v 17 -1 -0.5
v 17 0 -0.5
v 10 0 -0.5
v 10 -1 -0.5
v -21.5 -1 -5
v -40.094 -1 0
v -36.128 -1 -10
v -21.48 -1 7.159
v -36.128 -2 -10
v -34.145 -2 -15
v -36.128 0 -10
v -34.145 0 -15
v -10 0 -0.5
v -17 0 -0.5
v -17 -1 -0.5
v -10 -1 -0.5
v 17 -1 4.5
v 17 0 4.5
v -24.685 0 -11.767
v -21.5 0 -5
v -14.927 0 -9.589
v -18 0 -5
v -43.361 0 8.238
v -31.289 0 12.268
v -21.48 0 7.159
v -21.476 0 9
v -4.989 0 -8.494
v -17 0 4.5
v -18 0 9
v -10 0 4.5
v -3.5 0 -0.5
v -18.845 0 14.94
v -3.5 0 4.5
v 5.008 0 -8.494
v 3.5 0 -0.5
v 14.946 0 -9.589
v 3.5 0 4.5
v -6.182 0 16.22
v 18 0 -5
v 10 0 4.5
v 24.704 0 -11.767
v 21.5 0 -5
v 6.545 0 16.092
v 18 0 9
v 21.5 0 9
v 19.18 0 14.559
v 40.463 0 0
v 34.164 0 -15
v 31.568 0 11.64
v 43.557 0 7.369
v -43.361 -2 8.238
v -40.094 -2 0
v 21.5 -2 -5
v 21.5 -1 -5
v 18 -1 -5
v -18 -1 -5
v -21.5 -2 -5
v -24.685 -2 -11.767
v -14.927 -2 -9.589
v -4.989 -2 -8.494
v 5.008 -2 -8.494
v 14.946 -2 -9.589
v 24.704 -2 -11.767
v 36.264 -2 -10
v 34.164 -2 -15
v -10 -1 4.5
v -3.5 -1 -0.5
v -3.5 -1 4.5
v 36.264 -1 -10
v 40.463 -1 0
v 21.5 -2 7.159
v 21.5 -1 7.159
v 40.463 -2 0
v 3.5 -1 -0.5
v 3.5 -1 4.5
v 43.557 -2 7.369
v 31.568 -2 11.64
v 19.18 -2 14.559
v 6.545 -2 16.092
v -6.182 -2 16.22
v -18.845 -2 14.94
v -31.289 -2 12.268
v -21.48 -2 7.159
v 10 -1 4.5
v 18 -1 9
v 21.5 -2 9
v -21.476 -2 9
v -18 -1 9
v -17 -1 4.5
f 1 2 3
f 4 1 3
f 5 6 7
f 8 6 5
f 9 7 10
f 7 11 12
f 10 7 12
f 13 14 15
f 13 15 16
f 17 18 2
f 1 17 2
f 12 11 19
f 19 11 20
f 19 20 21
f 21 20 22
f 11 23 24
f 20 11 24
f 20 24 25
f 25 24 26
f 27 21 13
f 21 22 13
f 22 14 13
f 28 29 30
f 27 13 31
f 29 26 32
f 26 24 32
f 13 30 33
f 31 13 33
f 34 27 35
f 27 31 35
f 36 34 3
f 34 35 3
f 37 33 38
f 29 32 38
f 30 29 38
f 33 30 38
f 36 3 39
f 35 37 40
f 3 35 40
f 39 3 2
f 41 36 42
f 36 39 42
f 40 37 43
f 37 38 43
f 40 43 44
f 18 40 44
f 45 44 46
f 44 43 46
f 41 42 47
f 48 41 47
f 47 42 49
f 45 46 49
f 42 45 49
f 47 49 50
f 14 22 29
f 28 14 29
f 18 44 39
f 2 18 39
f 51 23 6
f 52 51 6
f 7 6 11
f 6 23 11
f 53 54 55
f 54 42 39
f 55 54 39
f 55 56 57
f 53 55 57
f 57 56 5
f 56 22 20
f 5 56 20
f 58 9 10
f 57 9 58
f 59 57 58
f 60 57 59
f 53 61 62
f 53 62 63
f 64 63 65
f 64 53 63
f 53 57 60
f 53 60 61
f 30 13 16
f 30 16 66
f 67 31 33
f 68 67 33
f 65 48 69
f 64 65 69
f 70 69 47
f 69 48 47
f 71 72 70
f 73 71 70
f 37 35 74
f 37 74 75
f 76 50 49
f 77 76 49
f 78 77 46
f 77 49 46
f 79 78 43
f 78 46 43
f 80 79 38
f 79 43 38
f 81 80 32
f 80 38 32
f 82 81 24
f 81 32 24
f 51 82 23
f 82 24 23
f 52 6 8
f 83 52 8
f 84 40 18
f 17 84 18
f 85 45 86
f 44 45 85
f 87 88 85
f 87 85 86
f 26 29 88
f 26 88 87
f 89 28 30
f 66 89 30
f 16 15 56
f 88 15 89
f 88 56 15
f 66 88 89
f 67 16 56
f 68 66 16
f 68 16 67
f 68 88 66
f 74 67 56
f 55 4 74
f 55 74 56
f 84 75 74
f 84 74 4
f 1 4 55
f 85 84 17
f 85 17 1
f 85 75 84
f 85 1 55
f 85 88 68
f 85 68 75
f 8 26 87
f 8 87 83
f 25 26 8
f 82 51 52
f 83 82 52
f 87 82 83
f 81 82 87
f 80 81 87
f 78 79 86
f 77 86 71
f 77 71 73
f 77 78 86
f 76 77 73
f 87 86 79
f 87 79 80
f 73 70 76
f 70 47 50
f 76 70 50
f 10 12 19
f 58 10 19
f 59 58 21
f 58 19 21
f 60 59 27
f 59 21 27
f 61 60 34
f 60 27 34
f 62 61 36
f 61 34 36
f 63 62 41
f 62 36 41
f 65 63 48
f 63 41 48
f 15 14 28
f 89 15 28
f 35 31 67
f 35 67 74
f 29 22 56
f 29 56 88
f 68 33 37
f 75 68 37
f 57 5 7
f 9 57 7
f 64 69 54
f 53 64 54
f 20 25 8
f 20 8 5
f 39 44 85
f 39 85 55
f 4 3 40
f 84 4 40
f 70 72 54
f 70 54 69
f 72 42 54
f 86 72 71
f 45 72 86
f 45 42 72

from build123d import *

# Parameters (mm, degrees)
F1_DEPTH = 2
F0_W     = 36
F0_H     = 14
F0_W_2   = 7
F0_H_2   = 5
F2_DEPTH = 1
F3_DEPTH = 2
F4_DEPTH = 1
F5_DEPTH = 1
F6_DEPTH = 2.001
F7_DEPTH = 2.001
F8_DEPTH = 1


# Not quite as in the source:
# - ends of sketch curves that miss each other by under 0.0002 mm in the source are joined


with BuildPart() as f1:
    # F0 (on Front) → F1 (new body)
    with BuildSketch(Plane.XZ):
        with BuildLine():
            Line((40.4628534786, 0), (43.5572046873, 7.3690142199))
            ThreePointArc((43.5572046873, 7.3690142199), (0.1833509298, 16.332060188), (-43.3610966095, 8.2383298181))
            Line((-43.3610966095, 8.2383298181), (-40.0939611875, 0))
            Line((-40.0939611875, 0), (-21.4795553588, 7.1586821743))
            Line((-21.4795553588, 7.1586821743), (-21.4764592054, 9.000000095))
            Line((-21.4764592054, 9.000000095), (-18, 9.000000095))
            Line((-18, 9.000000095), (18, 9.000000095))
            Line((18, 9.000000095), (21.5, 9.000000095))
            Line((21.5, 9.000000095), (21.5, 7.1586821743))
            Line((21.5, 7.1586821743), (40.4628534786, 0))
        make_face()
    extrude(amount=F1_DEPTH)

    # F0 (on Front) → F2 (join)
    with BuildSketch(Plane.XZ):
        Polygon((21.5, -4.999999905), (21.5, 7.1586821743), (21.5, 9.000000095), (18, 9.000000095), (18, -4.999999905), align=None)
        with Locations((0, 2.000000095)):
            Rectangle(F0_W, F0_H)
        with Locations((-13.5, 2.000000095)):
            Rectangle(F0_W_2, F0_H_2, mode=Mode.SUBTRACT)
        with Locations((0, 2.000000095)):
            Rectangle(F0_W_2, F0_H_2, mode=Mode.SUBTRACT)
        Polygon((17, 4.500000095), (17, -0.499999905), (15, -0.499999905), (10, -0.499999905), (10, 2.500000095), (10, 4.500000095), align=None, mode=Mode.SUBTRACT)
        Polygon((-21.4764592054, 9.000000095), (-21.4795553588, 7.1586821743), (-21.5, -4.9999801132), (-18, -4.999999905), (-18, 9.000000095), align=None)
    extrude(amount=F2_DEPTH)

    # F0 (on Front) → F3 (join)
    with BuildSketch(Plane.XZ):
        with BuildLine():
            Line((34.164145572, -15), (36.2637148742, -10))
            Line((36.2637148742, -10), (21.5, -4.999999905))
            Line((21.5, -4.999999905), (18, -4.999999905))
            Line((18, -4.999999905), (-18, -4.999999905))
            Line((-18, -4.999999905), (-21.5, -4.999999905))
            Line((-21.5, -4.999999905), (-36.1281871846, -10))
            Line((-36.1281871846, -10), (-34.1453001831, -15))
            ThreePointArc((-34.1453001831, -15), (0.0094226944, -8.3568901314), (34.164145572, -15))
        make_face()
    extrude(amount=F3_DEPTH)

    # F0 (on Front) → F4 (join)
    with BuildSketch(Plane.XZ):
        Polygon((36.2637148742, -10), (40.4628534786, 0), (21.5, 7.1586821743), (21.5, -4.999999905), align=None)
    extrude(amount=F4_DEPTH)

    # F0 (on Front) → F5 (join)
    with BuildSketch(Plane.XZ):
        Polygon((-21.4795553588, 7.1586821743), (-40.0939611875, 0), (-36.1281871846, -10), (-21.5, -4.999999905), align=None)
    extrude(amount=F5_DEPTH)

    # F0 (on Front) → F6 (cut, through all)
    with BuildSketch(Plane.XZ):
        Polygon((21.5, -4.999999905), (21.5, 7.1586821743), (21.5, 9.000000095), (18, 9.000000095), (18, -4.999999905), align=None)
    extrude(amount=F6_DEPTH, mode=Mode.SUBTRACT)

    # F0 (on Front) → F7 (cut, through all)
    with BuildSketch(Plane.XZ):
        Polygon((-21.4764592054, 9.000000095), (-21.4795553588, 7.1586821743), (-21.5, -4.9999801132), (-18, -4.999999905), (-18, 9.000000095), align=None)
    extrude(amount=F7_DEPTH, mode=Mode.SUBTRACT)

    # F0 (on Front) → F8 (join)
    with BuildSketch(Plane.XZ):
        with Locations((0, 2.000000095)):
            Rectangle(F0_W, F0_H)
        with Locations((-13.5, 2.000000095)):
            Rectangle(F0_W_2, F0_H_2, mode=Mode.SUBTRACT)
        with Locations((0, 2.000000095)):
            Rectangle(F0_W_2, F0_H_2, mode=Mode.SUBTRACT)
        Polygon((17, 4.500000095), (17, -0.499999905), (15, -0.499999905), (10, -0.499999905), (10, 2.500000095), (10, 4.500000095), align=None, mode=Mode.SUBTRACT)
    extrude(amount=F8_DEPTH)


solid = f1.part
